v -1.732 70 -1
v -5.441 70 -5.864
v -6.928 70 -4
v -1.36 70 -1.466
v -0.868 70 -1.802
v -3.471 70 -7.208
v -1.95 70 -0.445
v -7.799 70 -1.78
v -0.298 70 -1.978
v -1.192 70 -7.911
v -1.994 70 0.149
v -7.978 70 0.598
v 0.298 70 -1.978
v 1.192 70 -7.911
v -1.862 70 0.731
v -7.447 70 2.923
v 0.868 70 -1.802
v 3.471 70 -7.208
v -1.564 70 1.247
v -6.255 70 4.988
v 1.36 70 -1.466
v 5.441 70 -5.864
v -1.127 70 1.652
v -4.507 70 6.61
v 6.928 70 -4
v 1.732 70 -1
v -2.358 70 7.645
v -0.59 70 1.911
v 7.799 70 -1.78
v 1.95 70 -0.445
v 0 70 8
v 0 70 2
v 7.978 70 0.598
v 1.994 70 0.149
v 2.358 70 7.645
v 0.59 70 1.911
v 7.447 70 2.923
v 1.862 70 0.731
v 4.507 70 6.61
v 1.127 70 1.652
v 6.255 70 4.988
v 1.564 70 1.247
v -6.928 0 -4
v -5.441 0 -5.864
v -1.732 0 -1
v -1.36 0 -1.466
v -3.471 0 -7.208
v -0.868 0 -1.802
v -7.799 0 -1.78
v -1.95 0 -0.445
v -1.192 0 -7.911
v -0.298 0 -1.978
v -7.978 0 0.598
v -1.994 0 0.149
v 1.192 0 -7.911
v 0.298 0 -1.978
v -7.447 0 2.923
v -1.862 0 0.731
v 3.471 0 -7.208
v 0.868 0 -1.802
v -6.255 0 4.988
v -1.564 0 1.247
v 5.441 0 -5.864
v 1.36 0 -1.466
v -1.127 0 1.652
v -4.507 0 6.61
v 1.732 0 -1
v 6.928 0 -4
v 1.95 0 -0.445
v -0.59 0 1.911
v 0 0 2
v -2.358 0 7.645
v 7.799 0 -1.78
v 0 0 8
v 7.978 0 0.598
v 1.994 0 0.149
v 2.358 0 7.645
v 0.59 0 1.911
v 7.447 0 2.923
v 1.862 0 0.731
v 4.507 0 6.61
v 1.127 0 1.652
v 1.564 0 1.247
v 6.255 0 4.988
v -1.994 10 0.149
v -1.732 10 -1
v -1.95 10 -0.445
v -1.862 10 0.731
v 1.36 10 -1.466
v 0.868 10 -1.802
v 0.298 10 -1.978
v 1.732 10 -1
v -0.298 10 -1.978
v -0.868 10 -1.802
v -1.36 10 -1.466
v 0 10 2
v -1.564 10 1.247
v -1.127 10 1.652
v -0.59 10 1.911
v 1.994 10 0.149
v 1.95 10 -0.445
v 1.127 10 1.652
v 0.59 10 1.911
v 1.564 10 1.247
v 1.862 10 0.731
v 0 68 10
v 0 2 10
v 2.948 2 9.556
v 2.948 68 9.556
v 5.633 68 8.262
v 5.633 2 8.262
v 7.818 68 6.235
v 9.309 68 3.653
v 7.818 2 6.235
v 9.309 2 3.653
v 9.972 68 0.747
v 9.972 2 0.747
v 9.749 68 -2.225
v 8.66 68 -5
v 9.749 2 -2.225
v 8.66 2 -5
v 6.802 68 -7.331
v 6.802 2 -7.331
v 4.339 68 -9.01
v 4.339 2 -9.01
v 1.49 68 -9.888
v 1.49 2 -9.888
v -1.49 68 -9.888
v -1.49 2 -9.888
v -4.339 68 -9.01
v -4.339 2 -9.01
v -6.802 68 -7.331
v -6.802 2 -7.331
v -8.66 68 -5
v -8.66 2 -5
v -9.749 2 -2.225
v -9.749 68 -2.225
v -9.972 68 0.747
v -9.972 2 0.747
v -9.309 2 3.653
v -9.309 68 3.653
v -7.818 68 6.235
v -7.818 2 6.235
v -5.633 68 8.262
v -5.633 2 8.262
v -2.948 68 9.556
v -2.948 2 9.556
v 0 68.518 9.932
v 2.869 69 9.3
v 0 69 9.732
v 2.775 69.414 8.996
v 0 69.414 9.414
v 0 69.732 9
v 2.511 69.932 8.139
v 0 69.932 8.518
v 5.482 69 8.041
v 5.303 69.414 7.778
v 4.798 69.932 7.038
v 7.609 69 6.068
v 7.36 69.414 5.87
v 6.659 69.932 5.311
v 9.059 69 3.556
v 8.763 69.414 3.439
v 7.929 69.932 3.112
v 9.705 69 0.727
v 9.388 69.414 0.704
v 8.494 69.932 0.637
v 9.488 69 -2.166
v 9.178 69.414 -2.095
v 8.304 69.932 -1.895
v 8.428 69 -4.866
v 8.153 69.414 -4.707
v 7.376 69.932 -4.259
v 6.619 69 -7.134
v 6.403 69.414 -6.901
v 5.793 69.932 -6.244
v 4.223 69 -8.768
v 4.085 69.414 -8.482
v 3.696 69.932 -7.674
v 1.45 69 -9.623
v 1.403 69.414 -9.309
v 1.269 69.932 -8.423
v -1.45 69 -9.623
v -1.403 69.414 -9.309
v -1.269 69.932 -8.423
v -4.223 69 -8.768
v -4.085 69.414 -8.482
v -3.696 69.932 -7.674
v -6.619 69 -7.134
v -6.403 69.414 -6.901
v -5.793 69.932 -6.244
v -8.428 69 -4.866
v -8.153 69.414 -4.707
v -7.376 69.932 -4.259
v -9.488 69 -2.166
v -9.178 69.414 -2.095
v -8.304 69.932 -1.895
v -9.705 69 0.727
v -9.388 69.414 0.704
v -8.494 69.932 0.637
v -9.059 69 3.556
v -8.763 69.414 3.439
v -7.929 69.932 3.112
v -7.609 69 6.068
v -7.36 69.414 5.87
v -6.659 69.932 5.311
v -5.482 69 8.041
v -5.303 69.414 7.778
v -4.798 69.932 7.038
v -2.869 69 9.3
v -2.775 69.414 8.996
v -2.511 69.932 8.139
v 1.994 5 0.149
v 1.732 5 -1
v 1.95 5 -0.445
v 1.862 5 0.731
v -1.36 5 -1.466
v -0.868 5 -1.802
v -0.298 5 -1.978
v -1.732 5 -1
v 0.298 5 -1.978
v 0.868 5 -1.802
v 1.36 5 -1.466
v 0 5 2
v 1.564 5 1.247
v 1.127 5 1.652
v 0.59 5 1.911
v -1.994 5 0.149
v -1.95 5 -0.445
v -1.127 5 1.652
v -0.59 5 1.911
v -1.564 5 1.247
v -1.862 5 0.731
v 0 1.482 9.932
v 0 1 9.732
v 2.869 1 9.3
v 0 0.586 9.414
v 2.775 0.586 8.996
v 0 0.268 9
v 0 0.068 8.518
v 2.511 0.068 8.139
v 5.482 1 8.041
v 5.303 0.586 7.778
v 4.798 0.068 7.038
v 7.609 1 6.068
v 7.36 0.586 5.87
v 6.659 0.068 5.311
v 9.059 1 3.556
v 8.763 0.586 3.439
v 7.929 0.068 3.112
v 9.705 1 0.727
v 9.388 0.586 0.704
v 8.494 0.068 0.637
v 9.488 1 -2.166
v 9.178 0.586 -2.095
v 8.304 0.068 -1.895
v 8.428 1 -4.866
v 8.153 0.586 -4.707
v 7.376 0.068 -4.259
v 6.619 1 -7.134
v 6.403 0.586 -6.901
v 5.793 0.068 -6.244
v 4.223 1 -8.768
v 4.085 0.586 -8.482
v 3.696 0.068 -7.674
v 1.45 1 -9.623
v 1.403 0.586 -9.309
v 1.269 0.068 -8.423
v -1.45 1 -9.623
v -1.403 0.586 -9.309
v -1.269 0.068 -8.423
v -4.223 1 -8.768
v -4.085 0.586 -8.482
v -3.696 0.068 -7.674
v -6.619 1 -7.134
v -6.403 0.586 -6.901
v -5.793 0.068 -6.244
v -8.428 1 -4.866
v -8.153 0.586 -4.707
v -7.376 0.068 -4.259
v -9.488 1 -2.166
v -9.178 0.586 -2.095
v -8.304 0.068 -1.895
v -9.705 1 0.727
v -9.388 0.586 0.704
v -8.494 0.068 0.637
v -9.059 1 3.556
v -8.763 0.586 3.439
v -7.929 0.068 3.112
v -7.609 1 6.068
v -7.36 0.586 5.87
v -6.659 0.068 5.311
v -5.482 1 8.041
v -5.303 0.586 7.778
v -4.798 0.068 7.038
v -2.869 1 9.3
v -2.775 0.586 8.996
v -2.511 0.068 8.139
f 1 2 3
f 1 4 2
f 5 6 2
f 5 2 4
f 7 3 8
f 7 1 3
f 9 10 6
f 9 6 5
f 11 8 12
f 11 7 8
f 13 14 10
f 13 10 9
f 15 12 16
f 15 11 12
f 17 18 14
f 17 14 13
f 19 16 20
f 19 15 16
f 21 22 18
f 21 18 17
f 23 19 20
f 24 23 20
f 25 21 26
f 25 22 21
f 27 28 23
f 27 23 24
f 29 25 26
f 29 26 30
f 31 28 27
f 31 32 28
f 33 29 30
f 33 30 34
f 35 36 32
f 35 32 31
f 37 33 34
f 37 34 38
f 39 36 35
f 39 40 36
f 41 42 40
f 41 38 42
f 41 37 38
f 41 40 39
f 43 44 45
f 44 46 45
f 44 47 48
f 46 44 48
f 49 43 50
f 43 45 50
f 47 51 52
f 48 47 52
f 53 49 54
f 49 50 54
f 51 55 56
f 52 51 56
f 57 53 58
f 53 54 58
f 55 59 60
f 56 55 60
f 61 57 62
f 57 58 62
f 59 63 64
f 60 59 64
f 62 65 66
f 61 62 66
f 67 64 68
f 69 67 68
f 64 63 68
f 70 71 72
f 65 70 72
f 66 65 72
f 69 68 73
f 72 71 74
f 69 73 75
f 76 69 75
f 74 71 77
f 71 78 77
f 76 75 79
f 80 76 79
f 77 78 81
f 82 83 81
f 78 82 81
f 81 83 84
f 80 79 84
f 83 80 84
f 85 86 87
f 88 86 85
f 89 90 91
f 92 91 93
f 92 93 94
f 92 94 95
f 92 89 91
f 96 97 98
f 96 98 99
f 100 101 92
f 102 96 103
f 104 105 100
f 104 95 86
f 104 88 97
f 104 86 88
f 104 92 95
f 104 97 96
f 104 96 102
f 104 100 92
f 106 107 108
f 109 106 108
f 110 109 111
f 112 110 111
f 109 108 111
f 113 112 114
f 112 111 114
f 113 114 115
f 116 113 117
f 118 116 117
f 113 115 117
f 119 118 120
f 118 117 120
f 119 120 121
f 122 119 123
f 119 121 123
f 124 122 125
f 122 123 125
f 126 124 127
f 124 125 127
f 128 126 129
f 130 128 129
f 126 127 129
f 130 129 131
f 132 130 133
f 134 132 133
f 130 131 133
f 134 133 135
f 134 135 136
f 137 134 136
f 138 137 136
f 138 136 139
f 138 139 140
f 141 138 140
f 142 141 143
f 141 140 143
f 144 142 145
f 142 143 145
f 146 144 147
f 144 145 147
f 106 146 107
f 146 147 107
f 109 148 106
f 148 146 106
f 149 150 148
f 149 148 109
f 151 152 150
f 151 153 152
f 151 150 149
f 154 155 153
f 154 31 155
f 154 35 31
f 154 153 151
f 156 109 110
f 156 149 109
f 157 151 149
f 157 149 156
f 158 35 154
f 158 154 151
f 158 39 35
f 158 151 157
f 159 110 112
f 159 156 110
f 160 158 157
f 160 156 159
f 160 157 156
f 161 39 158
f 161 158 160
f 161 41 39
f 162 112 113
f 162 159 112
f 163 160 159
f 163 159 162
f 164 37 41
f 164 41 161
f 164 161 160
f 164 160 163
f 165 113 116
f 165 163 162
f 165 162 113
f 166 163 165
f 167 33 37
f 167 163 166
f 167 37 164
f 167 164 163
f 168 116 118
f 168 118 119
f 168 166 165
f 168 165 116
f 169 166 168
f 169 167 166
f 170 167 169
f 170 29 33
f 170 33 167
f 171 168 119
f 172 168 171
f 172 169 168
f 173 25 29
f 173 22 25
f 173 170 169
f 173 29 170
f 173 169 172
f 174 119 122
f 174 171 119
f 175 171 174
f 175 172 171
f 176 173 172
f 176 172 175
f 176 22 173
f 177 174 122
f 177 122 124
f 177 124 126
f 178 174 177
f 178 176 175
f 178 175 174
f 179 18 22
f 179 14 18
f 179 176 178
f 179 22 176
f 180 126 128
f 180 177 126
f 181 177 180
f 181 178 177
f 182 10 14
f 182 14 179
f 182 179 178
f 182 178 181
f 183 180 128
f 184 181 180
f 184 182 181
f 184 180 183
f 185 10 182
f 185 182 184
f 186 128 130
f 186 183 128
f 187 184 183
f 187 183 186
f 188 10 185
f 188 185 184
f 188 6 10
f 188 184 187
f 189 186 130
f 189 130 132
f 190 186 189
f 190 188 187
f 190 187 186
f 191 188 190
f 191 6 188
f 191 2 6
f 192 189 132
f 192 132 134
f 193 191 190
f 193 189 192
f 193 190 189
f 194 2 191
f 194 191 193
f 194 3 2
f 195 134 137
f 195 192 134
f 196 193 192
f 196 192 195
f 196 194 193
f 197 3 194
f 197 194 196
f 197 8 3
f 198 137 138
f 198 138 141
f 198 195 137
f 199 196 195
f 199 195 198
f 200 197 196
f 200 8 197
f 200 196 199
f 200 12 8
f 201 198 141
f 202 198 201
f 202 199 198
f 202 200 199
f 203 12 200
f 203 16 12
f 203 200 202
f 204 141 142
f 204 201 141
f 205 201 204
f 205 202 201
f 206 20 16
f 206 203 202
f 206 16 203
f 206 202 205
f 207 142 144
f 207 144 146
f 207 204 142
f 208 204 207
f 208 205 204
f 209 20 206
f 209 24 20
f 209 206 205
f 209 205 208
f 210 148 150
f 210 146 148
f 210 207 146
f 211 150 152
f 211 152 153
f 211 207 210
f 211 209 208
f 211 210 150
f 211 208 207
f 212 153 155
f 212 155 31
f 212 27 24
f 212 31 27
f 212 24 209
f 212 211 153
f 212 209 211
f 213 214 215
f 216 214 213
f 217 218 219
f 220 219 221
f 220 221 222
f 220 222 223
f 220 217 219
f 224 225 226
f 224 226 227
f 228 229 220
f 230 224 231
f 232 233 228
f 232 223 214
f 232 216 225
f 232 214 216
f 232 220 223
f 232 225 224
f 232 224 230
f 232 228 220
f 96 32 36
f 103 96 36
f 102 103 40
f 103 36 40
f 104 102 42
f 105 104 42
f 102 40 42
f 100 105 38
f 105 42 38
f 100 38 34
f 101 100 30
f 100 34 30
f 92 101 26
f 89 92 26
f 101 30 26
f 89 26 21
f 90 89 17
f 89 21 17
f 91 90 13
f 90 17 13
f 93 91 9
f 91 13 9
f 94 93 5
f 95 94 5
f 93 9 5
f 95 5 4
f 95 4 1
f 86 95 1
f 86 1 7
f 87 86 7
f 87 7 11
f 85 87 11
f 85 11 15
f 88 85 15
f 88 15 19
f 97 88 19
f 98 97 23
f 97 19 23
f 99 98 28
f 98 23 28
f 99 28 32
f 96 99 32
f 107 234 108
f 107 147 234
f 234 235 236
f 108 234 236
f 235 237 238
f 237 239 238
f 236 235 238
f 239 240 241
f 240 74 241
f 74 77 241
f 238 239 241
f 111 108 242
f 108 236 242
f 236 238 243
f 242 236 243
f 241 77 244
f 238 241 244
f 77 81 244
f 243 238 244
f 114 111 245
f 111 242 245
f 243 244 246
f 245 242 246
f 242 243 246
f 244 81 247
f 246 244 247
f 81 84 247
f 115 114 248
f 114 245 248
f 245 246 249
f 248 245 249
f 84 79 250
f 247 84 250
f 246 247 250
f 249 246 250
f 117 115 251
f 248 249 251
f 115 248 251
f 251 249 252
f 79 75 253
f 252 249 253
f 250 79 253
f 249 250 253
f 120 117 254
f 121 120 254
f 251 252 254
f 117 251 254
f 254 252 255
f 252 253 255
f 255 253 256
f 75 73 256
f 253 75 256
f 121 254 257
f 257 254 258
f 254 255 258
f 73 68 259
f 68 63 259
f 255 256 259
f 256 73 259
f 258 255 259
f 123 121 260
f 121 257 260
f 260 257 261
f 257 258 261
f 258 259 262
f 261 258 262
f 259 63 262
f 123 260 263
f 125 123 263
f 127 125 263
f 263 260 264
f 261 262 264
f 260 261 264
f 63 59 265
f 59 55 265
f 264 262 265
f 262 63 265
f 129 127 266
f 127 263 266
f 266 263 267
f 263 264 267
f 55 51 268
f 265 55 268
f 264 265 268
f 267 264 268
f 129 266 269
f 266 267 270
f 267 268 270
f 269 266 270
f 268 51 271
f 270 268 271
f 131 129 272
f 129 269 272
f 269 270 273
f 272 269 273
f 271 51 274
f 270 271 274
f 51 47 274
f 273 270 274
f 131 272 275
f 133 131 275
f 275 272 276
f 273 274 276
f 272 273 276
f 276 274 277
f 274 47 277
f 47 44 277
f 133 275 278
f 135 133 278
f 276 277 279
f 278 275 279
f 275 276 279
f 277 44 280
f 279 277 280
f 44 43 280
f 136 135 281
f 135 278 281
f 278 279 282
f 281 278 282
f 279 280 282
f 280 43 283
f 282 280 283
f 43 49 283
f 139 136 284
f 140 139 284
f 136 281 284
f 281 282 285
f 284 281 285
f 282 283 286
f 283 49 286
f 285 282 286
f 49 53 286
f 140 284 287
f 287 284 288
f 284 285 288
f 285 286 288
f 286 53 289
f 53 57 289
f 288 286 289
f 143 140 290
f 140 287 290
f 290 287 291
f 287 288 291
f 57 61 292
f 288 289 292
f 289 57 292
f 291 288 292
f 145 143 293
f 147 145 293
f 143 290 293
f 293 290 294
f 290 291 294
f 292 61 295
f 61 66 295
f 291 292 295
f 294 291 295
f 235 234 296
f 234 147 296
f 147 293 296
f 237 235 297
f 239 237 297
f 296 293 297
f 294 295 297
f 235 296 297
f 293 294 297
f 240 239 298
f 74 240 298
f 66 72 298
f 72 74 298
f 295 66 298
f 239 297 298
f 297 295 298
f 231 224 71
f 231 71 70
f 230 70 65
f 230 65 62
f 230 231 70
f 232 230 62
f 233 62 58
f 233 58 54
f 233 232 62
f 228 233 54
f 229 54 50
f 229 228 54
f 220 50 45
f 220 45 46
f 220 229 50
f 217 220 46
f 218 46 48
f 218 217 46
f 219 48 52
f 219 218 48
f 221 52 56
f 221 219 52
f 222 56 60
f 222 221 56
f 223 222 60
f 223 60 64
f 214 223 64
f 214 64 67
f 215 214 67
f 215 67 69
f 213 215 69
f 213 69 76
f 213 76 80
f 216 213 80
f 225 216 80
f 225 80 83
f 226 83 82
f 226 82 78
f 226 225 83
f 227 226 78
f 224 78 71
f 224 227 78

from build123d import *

# Parameters (mm, degrees)
SKETCH1_R           = 10
BOSS_EXTRUDE1_DEPTH = 70
SKETCH2_R           = 2
CUT_EXTRUDE1_DEPTH  = 60
FILLET1_R           = 2
CUT_EXTRUDE2_START  = -5
SKETCH4_R           = 2
CUT_EXTRUDE2_DEPTH  = 5


with BuildPart() as part:
    # Sketch1 → Boss-Extrude1 (new body)
    with BuildSketch(Plane(origin=(0, 0, 0), x_dir=(1, 0, 0), z_dir=(0, 1, 0))):
        with Locations(Location((0, 0, 0), (0, 0, 270))):
            Circle(SKETCH1_R)
    extrude(amount=BOSS_EXTRUDE1_DEPTH)

    # Sketch2 → Cut-Extrude1 (cut)
    with BuildSketch(Plane(origin=(0, 70, 0), x_dir=(1, 0, 0), z_dir=(0, 1, 0))):
        with Locations(Location((0, 0, 0), (0, 0, 270))):
            Circle(SKETCH2_R)
    extrude(amount=-CUT_EXTRUDE1_DEPTH, mode=Mode.SUBTRACT)

    # Fillet1
    fillet1_edges = [part.edges().sort_by_distance(p)[0] for p in [
        (0, 0, -10),
        (0, 70, -10),
    ]]
    fillet(fillet1_edges, radius=FILLET1_R)

    # Sketch4 → Cut-Extrude2 (cut)
    with BuildSketch(Plane.XZ.offset(CUT_EXTRUDE2_START)):
        with Locations(Location((0, 0, 0), (0, 0, 90))):
            Circle(SKETCH4_R)
    extrude(amount=CUT_EXTRUDE2_DEPTH, mode=Mode.SUBTRACT)


solid = part.part
